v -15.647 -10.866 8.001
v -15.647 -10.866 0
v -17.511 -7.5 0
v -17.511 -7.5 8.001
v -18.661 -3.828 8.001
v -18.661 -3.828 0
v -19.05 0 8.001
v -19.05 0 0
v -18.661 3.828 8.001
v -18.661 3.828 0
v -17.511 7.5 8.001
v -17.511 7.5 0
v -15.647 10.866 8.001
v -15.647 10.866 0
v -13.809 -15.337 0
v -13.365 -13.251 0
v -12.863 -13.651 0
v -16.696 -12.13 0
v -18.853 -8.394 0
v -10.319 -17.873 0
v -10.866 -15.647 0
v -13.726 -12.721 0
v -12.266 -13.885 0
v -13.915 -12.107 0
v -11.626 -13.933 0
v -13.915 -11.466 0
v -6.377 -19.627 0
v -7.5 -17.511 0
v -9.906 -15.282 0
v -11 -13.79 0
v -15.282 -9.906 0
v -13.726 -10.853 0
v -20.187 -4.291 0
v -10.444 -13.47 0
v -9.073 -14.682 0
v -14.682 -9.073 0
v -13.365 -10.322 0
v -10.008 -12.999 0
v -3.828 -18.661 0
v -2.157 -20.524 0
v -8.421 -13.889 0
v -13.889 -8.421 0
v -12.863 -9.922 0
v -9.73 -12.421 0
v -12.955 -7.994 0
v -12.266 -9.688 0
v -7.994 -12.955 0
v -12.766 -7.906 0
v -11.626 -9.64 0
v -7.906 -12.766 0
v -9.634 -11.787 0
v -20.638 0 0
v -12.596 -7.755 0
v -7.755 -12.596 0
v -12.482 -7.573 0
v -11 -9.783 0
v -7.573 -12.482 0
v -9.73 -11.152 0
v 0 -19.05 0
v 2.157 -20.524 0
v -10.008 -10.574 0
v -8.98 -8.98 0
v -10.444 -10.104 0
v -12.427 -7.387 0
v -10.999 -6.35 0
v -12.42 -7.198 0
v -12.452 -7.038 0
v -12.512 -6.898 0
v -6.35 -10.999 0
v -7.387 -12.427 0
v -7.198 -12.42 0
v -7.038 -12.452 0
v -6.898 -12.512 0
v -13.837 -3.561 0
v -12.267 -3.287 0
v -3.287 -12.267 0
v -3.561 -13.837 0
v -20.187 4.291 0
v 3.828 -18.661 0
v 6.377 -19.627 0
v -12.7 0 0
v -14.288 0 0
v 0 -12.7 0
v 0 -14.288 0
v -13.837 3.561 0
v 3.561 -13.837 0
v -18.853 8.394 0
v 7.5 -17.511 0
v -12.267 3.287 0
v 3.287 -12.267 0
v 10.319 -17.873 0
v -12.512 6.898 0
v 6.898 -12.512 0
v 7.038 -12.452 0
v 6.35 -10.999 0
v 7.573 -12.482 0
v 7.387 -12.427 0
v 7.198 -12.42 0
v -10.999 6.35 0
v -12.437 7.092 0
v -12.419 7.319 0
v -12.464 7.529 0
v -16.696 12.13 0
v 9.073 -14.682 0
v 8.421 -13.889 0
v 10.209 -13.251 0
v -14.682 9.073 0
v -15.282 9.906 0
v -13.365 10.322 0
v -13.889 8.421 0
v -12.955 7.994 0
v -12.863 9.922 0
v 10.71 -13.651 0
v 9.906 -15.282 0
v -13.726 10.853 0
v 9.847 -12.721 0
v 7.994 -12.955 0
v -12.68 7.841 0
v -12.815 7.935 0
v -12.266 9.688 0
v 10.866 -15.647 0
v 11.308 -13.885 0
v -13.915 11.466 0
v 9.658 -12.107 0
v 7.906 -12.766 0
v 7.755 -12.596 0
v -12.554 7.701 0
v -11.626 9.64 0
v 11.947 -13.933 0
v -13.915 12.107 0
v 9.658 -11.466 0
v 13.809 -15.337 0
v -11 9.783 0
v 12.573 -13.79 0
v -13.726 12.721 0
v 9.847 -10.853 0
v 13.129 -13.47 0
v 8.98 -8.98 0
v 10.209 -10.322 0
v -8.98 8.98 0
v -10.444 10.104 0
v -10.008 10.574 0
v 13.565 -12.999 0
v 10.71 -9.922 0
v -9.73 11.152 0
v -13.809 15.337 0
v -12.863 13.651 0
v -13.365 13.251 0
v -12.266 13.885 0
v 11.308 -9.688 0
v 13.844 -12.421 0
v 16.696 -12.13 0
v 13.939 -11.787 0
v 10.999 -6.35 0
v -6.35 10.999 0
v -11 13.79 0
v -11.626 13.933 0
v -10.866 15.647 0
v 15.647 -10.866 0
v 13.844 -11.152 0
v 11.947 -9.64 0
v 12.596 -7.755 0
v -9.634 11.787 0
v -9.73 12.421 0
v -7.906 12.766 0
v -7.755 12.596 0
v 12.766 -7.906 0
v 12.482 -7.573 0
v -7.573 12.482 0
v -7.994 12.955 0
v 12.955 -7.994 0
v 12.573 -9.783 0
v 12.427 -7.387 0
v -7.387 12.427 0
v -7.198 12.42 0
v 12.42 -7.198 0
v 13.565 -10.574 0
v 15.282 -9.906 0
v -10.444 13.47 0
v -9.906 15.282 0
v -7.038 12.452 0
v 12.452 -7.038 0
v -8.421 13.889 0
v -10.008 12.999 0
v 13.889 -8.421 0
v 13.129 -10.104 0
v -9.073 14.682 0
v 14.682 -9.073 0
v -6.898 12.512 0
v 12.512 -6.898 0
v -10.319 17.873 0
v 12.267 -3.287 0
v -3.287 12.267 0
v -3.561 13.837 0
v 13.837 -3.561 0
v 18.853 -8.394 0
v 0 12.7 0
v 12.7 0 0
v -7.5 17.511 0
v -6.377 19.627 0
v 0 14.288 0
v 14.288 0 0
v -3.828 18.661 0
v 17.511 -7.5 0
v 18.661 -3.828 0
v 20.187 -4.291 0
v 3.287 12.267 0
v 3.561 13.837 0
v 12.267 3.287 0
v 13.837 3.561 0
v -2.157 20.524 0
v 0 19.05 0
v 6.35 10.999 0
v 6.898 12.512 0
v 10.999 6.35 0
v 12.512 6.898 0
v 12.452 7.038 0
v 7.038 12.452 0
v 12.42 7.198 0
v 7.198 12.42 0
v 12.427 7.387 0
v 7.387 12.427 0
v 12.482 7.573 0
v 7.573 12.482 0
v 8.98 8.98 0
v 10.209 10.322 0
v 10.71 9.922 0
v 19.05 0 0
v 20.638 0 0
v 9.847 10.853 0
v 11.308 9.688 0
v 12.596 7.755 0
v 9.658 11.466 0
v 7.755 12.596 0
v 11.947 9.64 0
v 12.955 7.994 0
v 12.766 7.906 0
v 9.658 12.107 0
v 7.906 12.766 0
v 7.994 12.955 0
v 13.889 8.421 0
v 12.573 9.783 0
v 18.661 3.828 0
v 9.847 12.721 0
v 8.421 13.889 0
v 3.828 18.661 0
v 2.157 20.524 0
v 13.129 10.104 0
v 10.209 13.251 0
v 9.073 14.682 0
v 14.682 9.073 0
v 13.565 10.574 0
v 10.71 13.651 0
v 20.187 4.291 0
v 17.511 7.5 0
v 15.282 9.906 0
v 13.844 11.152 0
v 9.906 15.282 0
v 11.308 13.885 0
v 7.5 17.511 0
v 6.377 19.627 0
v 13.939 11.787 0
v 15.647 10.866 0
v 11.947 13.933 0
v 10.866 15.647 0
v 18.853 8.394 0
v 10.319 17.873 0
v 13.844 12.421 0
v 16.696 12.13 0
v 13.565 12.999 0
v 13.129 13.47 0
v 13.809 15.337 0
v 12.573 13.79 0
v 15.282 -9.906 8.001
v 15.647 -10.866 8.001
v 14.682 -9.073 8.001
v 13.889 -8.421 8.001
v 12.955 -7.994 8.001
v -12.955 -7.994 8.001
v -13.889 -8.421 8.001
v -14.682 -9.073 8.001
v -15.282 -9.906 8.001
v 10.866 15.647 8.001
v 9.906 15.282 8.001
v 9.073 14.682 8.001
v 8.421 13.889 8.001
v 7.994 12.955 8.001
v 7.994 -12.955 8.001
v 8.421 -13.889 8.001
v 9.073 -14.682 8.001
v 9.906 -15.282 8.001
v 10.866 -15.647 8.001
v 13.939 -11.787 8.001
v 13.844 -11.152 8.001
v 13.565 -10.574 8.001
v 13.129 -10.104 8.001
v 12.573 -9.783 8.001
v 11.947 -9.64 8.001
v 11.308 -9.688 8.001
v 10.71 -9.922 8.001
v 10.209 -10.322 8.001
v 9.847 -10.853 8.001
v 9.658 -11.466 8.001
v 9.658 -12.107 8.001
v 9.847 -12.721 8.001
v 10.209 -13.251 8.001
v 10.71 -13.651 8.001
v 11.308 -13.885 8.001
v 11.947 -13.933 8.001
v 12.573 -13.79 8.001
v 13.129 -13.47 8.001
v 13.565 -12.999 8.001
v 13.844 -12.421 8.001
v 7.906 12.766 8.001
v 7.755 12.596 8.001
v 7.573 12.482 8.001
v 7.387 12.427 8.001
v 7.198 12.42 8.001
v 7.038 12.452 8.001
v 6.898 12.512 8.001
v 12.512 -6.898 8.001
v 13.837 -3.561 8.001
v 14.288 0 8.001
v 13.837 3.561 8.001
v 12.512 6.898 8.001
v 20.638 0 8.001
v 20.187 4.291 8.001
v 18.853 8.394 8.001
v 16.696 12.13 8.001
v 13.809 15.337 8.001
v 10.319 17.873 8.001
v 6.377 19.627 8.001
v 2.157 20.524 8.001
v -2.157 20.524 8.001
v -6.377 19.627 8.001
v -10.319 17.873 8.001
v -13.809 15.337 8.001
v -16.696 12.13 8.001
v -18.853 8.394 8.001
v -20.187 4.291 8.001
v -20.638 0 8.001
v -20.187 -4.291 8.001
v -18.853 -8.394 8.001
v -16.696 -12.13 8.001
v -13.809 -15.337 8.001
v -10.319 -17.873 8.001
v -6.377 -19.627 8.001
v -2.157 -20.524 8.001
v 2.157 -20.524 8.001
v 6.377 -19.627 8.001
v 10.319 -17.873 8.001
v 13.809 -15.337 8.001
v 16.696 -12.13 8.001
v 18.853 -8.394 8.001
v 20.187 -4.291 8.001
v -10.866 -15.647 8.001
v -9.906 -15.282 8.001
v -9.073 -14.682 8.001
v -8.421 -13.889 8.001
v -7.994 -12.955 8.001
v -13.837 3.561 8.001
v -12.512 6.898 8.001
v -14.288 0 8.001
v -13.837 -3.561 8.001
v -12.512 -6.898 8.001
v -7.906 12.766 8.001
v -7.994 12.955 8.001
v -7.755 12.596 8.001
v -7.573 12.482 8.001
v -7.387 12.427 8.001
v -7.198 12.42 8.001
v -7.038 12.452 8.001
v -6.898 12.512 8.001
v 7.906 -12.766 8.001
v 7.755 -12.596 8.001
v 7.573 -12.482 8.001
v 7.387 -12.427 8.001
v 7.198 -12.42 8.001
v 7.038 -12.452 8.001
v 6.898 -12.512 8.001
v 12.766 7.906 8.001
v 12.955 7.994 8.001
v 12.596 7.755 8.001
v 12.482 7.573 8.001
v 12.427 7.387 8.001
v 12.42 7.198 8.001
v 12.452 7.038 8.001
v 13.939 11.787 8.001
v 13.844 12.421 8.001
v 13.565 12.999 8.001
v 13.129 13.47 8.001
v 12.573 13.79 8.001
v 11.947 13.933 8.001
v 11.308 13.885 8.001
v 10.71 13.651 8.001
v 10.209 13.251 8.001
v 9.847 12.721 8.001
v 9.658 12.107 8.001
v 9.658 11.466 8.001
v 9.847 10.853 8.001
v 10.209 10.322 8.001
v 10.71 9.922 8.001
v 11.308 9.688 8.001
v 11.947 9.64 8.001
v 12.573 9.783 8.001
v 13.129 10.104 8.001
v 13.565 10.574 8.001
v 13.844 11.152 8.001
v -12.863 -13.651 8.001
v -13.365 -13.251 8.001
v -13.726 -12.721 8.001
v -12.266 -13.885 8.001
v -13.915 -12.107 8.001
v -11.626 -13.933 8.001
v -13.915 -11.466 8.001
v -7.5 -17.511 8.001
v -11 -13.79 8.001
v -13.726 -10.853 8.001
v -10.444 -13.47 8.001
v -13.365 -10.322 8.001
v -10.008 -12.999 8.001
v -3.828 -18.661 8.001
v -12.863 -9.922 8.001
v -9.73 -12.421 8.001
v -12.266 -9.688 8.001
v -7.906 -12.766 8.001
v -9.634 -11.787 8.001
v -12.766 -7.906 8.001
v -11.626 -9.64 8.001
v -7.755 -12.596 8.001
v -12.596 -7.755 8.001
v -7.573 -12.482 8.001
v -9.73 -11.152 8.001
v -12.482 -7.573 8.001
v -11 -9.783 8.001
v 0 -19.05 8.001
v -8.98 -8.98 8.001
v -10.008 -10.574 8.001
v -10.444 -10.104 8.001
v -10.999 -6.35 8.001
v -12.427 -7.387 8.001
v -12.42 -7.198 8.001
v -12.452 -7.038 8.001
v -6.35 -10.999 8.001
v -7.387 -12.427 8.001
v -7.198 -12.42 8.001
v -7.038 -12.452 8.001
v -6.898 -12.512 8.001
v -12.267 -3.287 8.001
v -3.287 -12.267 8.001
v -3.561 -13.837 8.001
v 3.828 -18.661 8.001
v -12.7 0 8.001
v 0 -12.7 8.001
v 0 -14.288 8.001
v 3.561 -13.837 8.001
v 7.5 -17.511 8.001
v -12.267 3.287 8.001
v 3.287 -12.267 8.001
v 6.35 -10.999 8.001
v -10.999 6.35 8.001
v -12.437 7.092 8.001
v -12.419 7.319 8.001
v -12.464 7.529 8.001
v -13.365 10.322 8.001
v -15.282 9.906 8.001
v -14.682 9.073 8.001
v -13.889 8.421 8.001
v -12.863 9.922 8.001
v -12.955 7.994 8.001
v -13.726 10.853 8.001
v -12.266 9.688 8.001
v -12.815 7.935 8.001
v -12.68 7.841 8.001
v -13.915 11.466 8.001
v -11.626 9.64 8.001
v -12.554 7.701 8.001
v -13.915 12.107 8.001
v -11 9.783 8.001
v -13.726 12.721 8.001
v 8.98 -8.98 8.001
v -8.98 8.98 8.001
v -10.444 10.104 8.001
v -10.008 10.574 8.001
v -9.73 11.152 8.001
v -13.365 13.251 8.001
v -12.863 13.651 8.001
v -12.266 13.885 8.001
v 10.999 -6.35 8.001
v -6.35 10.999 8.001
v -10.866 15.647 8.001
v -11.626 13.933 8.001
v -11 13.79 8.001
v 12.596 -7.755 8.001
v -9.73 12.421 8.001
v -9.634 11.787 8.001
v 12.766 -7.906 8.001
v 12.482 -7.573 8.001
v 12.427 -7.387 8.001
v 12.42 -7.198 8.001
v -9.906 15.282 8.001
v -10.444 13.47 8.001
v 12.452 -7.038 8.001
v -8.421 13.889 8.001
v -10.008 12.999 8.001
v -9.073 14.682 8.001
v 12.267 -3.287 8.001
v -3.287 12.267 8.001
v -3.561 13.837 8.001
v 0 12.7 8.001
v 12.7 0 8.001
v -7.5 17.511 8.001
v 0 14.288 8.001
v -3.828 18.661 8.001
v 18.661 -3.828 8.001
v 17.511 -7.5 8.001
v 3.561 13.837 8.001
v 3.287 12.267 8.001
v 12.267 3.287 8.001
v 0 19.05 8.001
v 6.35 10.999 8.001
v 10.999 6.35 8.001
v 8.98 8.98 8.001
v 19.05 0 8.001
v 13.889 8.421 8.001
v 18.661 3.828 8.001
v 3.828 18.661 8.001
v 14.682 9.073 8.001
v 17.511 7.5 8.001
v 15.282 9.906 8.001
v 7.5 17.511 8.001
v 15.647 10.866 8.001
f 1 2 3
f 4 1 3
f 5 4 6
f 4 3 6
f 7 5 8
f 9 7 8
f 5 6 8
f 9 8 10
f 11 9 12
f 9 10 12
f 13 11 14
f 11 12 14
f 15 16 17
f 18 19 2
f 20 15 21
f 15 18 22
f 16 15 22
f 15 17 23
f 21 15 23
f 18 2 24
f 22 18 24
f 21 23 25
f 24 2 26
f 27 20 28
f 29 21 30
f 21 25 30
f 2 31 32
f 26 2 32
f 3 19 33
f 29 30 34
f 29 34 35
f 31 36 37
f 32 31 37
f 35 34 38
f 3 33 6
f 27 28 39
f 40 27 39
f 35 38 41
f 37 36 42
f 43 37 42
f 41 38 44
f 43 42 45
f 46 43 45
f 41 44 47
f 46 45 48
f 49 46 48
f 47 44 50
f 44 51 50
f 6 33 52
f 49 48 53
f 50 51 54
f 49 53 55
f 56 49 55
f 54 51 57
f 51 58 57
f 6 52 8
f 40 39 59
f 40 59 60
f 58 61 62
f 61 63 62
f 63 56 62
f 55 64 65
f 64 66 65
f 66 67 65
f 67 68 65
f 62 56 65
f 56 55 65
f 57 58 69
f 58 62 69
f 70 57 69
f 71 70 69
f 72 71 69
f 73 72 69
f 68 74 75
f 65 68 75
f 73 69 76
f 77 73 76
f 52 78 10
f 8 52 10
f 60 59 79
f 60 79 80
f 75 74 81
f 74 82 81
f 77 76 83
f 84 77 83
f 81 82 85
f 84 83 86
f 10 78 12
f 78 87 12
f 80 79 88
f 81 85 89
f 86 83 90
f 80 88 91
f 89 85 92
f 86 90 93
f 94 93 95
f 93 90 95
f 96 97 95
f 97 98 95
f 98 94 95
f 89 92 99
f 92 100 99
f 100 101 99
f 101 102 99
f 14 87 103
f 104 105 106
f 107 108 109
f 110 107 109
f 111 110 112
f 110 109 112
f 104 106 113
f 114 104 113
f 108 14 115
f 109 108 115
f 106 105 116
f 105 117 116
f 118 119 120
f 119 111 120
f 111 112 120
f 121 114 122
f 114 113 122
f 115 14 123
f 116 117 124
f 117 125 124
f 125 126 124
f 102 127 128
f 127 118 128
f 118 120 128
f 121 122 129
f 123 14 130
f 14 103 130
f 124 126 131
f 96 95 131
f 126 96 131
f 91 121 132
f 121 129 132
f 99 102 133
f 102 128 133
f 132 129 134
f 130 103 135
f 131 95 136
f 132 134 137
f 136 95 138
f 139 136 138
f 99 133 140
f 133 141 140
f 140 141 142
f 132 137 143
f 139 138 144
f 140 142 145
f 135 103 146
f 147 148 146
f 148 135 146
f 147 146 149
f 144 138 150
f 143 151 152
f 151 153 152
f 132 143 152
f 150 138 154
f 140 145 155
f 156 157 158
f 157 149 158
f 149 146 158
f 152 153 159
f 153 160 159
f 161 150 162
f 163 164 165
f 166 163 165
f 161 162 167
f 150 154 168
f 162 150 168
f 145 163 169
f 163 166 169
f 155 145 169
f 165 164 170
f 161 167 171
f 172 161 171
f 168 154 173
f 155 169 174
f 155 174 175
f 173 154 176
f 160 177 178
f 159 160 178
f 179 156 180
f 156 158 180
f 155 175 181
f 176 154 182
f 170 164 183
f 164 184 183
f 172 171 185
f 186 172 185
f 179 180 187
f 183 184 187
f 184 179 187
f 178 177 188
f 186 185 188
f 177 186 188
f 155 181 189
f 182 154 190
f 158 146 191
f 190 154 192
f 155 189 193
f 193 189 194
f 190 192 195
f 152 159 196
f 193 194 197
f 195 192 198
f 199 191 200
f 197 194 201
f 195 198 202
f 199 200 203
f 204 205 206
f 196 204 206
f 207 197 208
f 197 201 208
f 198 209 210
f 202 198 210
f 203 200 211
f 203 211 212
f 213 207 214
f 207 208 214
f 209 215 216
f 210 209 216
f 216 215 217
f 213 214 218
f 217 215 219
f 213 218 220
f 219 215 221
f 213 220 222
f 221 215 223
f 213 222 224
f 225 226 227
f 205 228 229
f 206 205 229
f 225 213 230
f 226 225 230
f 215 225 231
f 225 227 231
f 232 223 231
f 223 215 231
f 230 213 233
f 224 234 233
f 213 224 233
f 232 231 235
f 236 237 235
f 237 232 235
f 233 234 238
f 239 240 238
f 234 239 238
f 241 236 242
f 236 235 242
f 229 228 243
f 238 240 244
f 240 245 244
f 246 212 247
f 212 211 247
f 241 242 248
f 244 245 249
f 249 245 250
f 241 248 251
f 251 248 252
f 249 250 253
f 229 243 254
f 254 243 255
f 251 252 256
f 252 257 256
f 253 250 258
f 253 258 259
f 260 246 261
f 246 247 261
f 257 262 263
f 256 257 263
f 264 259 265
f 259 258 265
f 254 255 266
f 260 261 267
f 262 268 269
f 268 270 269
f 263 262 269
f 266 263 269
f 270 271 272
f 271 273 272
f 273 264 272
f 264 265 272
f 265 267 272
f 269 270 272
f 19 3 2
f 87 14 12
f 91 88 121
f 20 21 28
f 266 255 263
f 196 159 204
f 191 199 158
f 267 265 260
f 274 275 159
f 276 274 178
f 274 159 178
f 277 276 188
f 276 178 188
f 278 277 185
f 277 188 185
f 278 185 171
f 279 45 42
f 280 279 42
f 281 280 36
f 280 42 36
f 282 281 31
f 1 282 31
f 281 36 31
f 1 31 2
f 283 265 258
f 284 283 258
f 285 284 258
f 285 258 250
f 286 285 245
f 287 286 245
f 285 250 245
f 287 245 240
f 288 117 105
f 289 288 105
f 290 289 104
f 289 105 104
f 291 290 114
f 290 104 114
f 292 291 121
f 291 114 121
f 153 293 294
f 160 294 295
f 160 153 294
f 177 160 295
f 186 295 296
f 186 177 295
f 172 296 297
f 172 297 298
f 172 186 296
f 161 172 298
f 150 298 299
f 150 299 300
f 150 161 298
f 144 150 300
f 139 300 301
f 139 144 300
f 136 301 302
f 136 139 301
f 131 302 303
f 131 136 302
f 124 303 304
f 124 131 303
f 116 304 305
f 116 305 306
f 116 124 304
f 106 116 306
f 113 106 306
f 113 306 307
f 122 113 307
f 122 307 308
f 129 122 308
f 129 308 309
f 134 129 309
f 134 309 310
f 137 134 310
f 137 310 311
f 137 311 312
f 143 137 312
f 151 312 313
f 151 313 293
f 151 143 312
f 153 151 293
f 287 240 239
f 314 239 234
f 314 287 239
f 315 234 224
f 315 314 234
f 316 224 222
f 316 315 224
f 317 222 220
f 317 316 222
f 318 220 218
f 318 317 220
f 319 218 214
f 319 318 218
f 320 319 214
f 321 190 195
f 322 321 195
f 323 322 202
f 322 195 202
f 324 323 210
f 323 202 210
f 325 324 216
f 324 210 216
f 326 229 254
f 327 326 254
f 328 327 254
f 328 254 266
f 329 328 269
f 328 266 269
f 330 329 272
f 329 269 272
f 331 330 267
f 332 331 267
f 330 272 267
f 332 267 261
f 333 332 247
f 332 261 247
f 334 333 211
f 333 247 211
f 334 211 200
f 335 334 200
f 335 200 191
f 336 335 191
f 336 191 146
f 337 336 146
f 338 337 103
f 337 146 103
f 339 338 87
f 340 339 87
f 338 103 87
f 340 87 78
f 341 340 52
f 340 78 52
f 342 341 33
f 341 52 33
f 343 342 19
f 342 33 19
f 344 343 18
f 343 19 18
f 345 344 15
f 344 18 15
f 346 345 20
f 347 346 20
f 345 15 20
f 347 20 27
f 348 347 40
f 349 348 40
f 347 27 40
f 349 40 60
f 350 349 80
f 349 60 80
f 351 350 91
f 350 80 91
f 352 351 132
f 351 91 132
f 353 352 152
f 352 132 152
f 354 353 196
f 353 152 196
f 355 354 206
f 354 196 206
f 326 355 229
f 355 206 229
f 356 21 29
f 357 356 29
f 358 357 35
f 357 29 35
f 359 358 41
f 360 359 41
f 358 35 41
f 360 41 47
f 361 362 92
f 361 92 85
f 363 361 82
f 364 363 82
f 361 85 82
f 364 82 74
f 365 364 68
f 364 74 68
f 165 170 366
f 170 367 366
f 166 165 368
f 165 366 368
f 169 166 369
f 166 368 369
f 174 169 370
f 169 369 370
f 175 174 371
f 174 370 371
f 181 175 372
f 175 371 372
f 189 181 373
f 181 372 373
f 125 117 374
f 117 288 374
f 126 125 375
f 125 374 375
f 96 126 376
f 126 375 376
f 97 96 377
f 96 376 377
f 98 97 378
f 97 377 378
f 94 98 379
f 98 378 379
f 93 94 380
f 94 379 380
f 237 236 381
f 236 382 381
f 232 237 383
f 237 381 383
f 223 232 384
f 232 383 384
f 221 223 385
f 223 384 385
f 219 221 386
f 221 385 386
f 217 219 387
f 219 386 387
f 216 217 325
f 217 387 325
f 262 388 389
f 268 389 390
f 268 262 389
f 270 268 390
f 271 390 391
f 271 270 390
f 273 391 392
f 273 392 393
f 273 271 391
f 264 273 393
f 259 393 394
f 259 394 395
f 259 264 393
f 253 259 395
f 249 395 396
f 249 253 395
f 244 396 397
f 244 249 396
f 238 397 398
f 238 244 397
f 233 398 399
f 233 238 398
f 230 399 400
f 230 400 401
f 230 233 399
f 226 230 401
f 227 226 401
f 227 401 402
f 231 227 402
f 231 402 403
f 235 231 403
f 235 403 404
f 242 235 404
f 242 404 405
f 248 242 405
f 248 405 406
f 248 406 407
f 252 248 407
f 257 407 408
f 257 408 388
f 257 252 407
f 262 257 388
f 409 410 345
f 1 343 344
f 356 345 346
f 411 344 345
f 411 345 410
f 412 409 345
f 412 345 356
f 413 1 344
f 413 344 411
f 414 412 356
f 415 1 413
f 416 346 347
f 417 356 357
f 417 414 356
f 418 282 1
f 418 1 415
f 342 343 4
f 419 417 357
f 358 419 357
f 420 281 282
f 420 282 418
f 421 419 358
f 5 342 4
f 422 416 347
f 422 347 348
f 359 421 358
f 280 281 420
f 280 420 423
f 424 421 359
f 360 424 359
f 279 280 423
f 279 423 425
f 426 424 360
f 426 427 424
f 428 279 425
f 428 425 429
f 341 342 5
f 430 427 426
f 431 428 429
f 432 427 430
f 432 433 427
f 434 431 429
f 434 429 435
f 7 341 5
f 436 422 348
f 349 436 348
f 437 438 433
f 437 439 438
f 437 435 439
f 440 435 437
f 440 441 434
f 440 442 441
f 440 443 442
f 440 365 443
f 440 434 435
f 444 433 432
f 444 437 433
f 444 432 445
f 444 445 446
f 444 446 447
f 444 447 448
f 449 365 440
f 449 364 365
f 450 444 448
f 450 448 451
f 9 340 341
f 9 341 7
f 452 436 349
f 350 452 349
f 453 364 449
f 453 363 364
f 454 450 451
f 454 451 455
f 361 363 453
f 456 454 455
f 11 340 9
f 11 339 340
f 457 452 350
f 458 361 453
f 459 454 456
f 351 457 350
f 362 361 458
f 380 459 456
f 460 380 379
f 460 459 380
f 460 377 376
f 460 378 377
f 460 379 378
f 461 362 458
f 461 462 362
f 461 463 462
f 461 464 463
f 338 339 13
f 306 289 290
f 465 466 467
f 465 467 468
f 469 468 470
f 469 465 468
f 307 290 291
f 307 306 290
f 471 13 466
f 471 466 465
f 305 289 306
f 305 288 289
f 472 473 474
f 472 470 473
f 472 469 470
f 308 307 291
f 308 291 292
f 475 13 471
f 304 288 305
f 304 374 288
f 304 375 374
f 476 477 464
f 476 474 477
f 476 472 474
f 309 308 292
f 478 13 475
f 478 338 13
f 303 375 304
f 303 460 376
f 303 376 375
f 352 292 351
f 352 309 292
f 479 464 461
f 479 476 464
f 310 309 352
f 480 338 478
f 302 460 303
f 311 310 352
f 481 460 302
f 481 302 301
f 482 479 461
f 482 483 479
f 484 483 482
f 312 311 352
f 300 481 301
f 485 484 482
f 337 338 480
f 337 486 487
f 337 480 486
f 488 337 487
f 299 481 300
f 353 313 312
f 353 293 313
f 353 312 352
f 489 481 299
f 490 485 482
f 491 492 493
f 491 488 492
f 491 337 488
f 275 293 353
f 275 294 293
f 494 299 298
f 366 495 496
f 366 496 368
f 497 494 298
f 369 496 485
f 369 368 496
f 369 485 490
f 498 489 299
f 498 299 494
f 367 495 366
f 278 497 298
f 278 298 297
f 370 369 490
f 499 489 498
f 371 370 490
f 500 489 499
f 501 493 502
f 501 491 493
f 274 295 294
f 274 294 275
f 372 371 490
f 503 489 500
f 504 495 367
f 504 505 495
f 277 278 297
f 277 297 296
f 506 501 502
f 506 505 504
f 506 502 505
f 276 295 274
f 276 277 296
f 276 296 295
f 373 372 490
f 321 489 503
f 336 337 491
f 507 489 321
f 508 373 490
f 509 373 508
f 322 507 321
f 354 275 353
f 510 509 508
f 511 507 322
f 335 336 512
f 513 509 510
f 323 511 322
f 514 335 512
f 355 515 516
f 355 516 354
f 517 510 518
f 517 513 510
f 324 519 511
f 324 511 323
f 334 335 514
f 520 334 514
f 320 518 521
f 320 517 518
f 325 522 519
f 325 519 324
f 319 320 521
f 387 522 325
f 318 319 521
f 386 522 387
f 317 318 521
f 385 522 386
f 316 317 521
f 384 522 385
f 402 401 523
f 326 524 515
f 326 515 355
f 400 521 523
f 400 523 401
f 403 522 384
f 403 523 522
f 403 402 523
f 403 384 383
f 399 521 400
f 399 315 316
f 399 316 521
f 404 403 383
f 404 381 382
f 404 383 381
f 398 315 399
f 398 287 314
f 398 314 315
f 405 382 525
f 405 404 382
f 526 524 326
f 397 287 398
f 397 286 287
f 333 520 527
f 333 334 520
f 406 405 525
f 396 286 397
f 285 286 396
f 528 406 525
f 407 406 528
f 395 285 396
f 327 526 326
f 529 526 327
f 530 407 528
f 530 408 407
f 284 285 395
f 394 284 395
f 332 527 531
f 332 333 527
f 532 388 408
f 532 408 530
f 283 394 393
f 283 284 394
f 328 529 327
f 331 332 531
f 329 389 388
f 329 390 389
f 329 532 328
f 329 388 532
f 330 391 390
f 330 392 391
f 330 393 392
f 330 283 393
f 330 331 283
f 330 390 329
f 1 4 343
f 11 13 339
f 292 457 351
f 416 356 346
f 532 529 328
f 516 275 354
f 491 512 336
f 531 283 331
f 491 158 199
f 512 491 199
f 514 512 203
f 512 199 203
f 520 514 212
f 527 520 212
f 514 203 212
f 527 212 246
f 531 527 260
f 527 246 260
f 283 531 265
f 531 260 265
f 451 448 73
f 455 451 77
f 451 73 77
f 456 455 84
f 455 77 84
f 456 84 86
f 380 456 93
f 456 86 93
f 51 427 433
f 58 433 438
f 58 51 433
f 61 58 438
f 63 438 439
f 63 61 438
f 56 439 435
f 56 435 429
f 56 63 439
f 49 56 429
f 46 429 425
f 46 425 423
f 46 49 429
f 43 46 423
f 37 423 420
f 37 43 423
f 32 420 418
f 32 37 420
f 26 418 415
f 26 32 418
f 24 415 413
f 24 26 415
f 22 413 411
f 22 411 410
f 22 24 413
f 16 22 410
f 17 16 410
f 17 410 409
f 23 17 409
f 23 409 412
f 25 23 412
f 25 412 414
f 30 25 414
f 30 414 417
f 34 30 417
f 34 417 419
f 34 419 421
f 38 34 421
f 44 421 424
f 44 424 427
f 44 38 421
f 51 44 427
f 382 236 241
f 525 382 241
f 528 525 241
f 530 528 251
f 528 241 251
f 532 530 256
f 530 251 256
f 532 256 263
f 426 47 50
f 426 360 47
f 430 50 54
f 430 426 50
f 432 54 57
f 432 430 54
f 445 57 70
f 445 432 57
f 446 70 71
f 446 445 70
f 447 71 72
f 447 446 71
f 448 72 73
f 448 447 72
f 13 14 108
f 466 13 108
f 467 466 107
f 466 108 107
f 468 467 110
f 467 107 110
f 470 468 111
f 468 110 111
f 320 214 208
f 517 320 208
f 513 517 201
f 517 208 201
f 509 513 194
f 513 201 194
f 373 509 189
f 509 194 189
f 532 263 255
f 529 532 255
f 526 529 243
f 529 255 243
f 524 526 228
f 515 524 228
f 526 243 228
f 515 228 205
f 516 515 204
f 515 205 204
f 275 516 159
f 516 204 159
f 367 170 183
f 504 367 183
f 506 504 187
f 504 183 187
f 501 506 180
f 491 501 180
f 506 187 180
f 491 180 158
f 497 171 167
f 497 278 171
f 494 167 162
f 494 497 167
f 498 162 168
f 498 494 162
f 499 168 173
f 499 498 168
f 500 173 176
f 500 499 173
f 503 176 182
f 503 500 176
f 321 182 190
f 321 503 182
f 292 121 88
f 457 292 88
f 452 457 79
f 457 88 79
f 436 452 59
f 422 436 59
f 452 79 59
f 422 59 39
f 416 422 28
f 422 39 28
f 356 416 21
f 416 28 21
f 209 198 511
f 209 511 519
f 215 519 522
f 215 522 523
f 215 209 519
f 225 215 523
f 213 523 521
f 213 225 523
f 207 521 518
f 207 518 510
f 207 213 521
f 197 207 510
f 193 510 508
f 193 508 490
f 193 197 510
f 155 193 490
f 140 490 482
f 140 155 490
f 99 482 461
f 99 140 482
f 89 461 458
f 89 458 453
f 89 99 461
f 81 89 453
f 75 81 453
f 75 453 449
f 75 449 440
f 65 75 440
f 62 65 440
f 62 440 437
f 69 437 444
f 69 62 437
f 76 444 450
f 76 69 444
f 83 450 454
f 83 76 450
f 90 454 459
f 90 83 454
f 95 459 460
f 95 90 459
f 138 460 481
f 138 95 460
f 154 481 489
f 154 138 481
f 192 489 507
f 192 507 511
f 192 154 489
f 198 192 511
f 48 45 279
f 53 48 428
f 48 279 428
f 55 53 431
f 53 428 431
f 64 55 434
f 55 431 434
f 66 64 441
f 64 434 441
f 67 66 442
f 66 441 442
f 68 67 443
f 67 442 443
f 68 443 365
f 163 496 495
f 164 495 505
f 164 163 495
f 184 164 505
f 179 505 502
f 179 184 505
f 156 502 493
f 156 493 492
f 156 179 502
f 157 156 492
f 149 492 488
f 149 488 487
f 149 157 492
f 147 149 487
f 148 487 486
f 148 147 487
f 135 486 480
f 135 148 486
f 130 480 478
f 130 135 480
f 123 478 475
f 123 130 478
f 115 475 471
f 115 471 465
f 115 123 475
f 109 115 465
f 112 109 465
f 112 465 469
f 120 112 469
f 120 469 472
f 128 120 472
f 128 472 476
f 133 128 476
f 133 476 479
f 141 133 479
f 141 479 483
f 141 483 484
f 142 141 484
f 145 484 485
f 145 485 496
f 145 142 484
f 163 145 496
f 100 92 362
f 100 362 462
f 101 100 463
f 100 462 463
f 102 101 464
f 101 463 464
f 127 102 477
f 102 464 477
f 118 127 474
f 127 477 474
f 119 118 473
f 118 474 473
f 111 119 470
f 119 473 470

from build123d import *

# Parameters (mm, degrees)
F0_R     = 20.6375062807
F0_R_2   = 2.15265
F0_R_3   = 12.7000062807
F1_DEPTH = 8.001
F3_DEPTH = 8.001
F4_COUNT = 4
F4_ANGLE = 270
F5_R     = 0.762


with BuildPart() as f1:
    # F0 (on Top) → F1 (new body)
    with BuildSketch(Plane.XY):
        Circle(F0_R)
        with Locations((-11.7865906, -11.7865906)):
            Circle(F0_R_2, mode=Mode.SUBTRACT)
        with Locations((11.7865906, -11.7865906)):
            Circle(F0_R_2, mode=Mode.SUBTRACT)
        with Locations((-11.7865906, 11.7865906)):
            Circle(F0_R_2, mode=Mode.SUBTRACT)
        Circle(F0_R_3, mode=Mode.SUBTRACT)
        with Locations((11.7865906, 11.7865906)):
            Circle(F0_R_2, mode=Mode.SUBTRACT)
    extrude(amount=F1_DEPTH)

    # F2 (on face) → F3 (cut, through all)
    with BuildSketch(Plane(origin=(0, 0, 0), x_dir=(1, 0, 0), z_dir=(0, 0, -1))):
        with BuildLine():
            ThreePointArc((10.8660418044, -15.6471043582), (8.7251193967, -14.3121342314), (7.8214782953, -11.9564757766))
            ThreePointArc((7.8214782953, -11.9564757766), (0, -14.2875062807), (-7.8214782953, -11.9564757766))
            ThreePointArc((-7.8214782953, -11.9564757766), (-8.7251193967, -14.3121342314), (-10.8660418044, -15.6471043582))
            ThreePointArc((-10.8660418044, -15.6471043582), (0, -19.0500062807), (10.8660418044, -15.6471043582))
        make_face()
    f3 = extrude(amount=-F3_DEPTH, mode=Mode.SUBTRACT)

    # F4: F3 ×4 about axis
    f4_axis = Axis((0, 0, 0), (0, 0, -1))
    for i in range(1, F4_COUNT):
        add(f3.rotate(f4_axis, i * F4_ANGLE / (F4_COUNT - 1)), mode=Mode.SUBTRACT)

    # F5
    f5_edges = [f1.edges().sort_by_distance(p)[0] for p in [
        (-7.821478, 11.956476, 4.0005),
        (7.821478, 11.956476, 4.0005),
        (-11.956476, -7.821478, 4.0005),
        (-11.956476, 7.821478, 4.0005),
        (-7.821478, -11.956476, 4.0005),
        (7.821478, -11.956476, 4.0005),
        (11.956476, 7.821478, 4.0005),
        (11.956476, -7.821478, 4.0005),
    ]]
    fillet(f5_edges, radius=F5_R)


solid = f1.part
